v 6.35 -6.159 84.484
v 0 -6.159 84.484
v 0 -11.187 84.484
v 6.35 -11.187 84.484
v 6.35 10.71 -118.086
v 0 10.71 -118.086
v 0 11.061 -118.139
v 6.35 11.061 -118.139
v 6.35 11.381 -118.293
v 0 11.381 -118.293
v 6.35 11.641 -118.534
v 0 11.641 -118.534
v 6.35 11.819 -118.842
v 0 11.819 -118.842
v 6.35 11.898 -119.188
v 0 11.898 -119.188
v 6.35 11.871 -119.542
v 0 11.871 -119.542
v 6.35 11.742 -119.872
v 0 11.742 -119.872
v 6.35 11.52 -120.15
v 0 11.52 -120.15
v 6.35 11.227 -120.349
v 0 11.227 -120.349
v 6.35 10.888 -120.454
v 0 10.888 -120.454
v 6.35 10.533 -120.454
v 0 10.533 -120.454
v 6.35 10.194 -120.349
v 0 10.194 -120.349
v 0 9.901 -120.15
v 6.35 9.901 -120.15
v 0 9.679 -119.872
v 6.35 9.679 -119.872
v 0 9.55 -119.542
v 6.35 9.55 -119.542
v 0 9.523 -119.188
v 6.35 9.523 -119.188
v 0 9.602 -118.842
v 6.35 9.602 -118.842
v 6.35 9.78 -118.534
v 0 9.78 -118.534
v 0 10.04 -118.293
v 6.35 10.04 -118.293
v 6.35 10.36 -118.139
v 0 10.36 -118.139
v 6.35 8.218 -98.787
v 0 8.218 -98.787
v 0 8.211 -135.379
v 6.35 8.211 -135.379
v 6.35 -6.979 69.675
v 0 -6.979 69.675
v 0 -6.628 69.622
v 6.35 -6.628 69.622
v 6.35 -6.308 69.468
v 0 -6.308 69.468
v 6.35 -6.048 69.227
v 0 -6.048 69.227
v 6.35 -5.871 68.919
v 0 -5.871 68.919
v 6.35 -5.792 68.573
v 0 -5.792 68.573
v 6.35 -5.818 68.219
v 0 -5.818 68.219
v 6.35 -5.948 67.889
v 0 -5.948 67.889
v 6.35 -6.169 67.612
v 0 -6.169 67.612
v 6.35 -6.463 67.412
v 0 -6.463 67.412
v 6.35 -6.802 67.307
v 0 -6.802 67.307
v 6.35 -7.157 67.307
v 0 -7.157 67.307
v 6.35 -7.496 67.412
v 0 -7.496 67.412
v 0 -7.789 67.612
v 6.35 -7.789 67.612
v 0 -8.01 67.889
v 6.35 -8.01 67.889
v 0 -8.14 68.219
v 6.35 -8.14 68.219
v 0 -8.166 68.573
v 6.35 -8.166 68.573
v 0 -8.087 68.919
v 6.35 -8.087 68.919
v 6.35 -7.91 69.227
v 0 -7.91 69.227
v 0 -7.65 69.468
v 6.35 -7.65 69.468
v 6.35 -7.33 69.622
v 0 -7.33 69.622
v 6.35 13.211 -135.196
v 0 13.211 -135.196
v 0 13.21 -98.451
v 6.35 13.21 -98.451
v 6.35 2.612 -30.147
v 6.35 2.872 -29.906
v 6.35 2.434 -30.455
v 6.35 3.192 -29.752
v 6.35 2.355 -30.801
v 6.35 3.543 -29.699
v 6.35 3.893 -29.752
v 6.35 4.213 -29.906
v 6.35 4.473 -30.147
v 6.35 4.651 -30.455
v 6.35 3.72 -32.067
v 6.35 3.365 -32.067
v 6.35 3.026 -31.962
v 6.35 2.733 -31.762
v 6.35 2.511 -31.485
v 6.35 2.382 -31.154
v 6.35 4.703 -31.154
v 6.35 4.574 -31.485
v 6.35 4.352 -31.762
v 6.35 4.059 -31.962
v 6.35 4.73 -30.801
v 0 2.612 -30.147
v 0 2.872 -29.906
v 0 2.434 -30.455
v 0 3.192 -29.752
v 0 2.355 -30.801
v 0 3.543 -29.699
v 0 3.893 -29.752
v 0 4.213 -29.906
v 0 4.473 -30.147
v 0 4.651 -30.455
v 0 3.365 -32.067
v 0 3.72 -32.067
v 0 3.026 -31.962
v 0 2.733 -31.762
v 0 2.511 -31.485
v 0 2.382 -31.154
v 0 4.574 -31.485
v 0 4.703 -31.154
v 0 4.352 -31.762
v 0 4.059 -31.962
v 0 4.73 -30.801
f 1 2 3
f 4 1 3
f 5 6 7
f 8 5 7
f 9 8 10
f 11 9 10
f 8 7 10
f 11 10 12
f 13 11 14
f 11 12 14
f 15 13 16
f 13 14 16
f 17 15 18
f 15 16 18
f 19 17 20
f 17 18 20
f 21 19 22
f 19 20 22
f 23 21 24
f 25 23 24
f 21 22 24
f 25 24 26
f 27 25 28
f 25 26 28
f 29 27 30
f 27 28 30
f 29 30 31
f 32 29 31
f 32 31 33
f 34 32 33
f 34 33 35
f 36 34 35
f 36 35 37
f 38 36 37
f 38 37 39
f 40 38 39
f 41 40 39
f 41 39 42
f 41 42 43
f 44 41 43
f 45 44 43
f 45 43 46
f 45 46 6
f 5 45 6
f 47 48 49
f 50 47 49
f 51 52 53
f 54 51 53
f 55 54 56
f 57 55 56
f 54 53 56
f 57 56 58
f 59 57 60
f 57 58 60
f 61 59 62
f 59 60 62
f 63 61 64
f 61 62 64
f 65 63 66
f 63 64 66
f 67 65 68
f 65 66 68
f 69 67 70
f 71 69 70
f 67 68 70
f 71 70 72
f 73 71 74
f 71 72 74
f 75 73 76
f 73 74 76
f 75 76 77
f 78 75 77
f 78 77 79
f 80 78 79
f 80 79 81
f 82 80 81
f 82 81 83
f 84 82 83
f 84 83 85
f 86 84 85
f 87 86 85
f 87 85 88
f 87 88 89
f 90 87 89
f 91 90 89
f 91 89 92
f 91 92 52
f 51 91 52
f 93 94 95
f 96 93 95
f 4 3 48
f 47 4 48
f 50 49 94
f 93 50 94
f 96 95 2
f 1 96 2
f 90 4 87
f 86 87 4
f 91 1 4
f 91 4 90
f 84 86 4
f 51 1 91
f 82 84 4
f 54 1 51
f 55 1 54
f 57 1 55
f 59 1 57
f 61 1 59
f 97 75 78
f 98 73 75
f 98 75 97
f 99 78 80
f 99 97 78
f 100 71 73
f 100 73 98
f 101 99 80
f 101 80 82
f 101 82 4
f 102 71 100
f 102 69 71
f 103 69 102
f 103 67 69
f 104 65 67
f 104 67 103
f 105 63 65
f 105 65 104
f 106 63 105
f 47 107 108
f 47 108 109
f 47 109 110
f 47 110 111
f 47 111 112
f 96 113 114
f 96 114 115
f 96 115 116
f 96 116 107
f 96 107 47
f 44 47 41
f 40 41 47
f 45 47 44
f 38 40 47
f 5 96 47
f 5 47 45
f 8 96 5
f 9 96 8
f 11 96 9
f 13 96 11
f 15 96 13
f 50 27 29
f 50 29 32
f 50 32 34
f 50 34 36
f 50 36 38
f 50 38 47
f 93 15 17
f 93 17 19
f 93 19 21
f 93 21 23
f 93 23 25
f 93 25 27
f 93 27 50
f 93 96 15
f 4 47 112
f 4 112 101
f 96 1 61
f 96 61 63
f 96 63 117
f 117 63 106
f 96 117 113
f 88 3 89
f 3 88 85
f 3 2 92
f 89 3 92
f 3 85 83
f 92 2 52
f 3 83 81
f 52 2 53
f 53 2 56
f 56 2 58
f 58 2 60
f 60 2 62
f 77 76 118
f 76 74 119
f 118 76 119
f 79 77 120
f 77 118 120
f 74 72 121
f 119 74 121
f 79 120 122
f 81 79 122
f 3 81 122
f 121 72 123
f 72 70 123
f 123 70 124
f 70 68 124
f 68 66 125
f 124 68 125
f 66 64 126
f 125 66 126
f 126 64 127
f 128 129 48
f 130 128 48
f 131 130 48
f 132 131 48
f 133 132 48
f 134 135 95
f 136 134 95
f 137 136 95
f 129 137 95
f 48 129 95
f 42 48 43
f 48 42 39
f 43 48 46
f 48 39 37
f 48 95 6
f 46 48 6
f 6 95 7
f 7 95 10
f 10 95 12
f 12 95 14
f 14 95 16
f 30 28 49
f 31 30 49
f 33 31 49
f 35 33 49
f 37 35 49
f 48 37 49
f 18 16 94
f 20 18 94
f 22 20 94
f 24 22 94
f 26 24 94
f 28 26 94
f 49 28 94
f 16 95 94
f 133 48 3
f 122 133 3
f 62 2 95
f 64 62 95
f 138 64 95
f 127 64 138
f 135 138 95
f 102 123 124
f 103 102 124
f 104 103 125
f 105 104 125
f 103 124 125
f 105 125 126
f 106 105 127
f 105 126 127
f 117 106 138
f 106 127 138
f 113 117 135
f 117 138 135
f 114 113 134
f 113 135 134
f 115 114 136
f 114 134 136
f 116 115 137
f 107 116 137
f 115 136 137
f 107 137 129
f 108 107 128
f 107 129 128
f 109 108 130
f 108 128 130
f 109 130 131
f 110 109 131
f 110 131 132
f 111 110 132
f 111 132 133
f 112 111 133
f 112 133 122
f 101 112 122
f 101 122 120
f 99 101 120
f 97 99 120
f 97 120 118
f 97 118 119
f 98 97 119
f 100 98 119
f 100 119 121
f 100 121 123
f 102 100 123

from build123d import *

# Parameters (mm, degrees)
BOSS_EXTRUDE1_DEPTH                 = 6.35
F_3_32_0_09375_DIAMETER_HOLE1_D     = 2.38125
F_3_32_0_09375_DIAMETER_HOLE1_DEPTH = 8
F_3_32_0_09375_DIAMETER_HOLE1_TIP   = 0.715399675


with BuildPart() as part:
    # Sketch8 → Boss-Extrude1 (new body)
    with BuildSketch(Plane(origin=(0, 0, 0), x_dir=(0, 0, -1), z_dir=(1, 0, 0))):
        Polygon((-84.484414223, -6.159266037), (-84.484414223, -11.187214329), (98.786832766, 8.217533909), (135.378560096, 8.21091712), (135.196228698, 13.21091712), (98.450522899, 13.209873734), align=None)
    extrude(amount=BOSS_EXTRUDE1_DEPTH)

    # 3/32 (0.09375) Diameter Hole1
    with Locations(Plane(origin=(6.35, 0, 0), x_dir=(0, 0, -1), z_dir=(1, 0, 0))):
        with Locations((-68.484414223, -6.979161178), (30.889527611, 3.542545606), (119.276776099, 10.71046509)):
            Hole(F_3_32_0_09375_DIAMETER_HOLE1_D / 2, depth=F_3_32_0_09375_DIAMETER_HOLE1_DEPTH)
            with Locations((0, 0, -(F_3_32_0_09375_DIAMETER_HOLE1_DEPTH + F_3_32_0_09375_DIAMETER_HOLE1_TIP / 2))):  # 118° drill point
                Cone(0, F_3_32_0_09375_DIAMETER_HOLE1_D / 2, F_3_32_0_09375_DIAMETER_HOLE1_TIP, mode=Mode.SUBTRACT)


solid = part.part
